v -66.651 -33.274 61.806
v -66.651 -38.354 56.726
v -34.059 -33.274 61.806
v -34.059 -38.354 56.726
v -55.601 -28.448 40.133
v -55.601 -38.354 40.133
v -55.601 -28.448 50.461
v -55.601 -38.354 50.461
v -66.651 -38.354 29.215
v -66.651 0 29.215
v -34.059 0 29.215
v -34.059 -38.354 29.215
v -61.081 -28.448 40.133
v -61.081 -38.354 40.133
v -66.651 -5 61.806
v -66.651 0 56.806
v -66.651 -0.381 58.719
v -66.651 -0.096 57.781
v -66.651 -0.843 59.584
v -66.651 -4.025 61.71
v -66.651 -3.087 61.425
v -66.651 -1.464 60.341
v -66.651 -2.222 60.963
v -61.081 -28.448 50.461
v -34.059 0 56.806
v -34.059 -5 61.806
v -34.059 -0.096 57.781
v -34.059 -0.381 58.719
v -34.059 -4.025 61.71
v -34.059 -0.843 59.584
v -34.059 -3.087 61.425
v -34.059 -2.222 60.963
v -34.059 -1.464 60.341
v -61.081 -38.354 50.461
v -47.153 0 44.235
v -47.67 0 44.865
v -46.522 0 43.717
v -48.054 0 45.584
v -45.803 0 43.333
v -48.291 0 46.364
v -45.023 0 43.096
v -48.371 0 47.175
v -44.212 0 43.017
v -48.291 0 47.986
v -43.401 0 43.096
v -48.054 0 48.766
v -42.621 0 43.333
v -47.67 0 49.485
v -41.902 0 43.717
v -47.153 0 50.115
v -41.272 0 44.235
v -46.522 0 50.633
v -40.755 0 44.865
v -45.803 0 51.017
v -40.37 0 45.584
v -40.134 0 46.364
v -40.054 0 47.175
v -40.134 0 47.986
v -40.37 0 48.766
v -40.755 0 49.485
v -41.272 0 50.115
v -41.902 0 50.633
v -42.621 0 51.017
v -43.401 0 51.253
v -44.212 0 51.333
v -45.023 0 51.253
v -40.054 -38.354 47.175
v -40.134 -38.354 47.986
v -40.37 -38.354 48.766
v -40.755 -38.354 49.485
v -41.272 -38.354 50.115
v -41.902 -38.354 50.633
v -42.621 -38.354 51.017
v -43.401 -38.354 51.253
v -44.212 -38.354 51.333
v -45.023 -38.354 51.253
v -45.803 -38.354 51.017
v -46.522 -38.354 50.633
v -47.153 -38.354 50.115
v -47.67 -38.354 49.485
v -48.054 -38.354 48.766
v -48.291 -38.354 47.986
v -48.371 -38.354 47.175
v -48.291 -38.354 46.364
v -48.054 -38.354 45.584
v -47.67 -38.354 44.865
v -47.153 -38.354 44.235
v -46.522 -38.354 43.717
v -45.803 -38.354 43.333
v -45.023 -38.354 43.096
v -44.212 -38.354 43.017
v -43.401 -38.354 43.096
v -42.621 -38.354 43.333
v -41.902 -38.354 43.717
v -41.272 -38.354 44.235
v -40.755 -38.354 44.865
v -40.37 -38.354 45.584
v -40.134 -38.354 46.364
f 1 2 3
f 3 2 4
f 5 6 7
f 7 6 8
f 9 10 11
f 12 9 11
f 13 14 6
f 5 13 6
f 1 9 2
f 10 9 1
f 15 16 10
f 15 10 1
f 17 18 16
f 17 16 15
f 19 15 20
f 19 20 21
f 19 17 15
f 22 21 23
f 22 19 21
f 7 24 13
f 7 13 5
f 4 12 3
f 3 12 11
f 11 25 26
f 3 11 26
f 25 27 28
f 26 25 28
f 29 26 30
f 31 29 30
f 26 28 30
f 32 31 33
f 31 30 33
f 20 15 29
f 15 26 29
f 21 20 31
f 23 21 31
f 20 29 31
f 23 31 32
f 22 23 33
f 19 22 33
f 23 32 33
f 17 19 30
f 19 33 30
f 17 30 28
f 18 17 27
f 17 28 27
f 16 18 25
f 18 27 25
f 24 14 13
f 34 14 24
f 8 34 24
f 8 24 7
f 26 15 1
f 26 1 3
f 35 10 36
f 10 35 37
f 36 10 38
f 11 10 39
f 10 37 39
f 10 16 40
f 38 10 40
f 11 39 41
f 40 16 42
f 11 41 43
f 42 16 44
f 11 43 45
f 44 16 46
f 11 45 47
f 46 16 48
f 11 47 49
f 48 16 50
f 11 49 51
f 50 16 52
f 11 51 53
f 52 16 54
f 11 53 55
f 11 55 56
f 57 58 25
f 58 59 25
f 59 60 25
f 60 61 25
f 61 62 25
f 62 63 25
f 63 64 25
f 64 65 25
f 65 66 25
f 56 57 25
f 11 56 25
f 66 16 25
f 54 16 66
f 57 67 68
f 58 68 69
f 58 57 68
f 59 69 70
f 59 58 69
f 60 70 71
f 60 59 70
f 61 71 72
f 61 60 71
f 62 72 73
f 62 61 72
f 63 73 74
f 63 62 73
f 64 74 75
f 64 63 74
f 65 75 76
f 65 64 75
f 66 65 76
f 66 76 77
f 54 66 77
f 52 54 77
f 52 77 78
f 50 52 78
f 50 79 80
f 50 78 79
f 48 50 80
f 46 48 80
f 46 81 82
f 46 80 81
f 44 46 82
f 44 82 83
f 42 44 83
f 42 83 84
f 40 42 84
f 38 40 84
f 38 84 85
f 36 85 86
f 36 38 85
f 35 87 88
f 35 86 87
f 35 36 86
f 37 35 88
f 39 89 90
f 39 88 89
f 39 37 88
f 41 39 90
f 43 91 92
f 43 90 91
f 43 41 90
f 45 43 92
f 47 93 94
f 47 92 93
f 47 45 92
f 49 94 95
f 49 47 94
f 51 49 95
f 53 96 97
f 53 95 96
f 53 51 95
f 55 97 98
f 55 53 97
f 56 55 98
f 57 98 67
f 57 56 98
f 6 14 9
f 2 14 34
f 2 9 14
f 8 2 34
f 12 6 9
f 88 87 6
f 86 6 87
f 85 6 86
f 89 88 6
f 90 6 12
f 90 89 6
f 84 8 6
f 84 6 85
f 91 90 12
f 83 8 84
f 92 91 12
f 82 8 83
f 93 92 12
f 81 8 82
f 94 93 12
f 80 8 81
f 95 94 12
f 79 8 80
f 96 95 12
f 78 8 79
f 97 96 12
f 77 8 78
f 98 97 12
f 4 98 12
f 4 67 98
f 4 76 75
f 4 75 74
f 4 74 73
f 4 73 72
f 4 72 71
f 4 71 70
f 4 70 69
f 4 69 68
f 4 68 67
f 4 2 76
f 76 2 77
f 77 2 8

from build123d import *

# Parameters (mm, degrees)
F0_W     = 32.591233
F0_H     = 32.591233
F1_DEPTH = 38.354
F2_SIZE  = 5.08
F3_R     = 4.158382
F4_DEPTH = 40.132
F5_W     = 5.479913
F5_H     = 10.327767
F6_DEPTH = 9.906
F7_R     = 5


with BuildPart() as f1:
    # F0 (on Front) → F1 (new body)
    with BuildSketch(Plane.XZ):
        with Locations((-50.354915, 45.510276)):
            Rectangle(F0_W, F0_H)
    extrude(amount=F1_DEPTH)

    # F2
    f2_edges = [f1.edges().sort_by_distance(p)[0] for p in [
        (-50.354916, -38.354, 61.805893),
    ]]
    chamfer(f2_edges, length=F2_SIZE)

    # F3 (on face) → F4 (cut)
    with BuildSketch(Plane.XZ):
        with Locations((-44.212125, 47.174979)):
            Circle(F3_R)
    extrude(amount=F4_DEPTH, mode=Mode.SUBTRACT)

    # F5 (on face) → F6 (cut)
    with BuildSketch(Plane.XZ.offset(38.354)):
        with Locations((-58.341155, 45.296827)):
            Rectangle(F5_W, F5_H)
    extrude(amount=-F6_DEPTH, mode=Mode.SUBTRACT)

    # F7
    f7_edges = [f1.edges().sort_by_distance(p)[0] for p in [
        (-50.354916, 0, 61.805893),
    ]]
    fillet(f7_edges, radius=F7_R)


solid = f1.part
